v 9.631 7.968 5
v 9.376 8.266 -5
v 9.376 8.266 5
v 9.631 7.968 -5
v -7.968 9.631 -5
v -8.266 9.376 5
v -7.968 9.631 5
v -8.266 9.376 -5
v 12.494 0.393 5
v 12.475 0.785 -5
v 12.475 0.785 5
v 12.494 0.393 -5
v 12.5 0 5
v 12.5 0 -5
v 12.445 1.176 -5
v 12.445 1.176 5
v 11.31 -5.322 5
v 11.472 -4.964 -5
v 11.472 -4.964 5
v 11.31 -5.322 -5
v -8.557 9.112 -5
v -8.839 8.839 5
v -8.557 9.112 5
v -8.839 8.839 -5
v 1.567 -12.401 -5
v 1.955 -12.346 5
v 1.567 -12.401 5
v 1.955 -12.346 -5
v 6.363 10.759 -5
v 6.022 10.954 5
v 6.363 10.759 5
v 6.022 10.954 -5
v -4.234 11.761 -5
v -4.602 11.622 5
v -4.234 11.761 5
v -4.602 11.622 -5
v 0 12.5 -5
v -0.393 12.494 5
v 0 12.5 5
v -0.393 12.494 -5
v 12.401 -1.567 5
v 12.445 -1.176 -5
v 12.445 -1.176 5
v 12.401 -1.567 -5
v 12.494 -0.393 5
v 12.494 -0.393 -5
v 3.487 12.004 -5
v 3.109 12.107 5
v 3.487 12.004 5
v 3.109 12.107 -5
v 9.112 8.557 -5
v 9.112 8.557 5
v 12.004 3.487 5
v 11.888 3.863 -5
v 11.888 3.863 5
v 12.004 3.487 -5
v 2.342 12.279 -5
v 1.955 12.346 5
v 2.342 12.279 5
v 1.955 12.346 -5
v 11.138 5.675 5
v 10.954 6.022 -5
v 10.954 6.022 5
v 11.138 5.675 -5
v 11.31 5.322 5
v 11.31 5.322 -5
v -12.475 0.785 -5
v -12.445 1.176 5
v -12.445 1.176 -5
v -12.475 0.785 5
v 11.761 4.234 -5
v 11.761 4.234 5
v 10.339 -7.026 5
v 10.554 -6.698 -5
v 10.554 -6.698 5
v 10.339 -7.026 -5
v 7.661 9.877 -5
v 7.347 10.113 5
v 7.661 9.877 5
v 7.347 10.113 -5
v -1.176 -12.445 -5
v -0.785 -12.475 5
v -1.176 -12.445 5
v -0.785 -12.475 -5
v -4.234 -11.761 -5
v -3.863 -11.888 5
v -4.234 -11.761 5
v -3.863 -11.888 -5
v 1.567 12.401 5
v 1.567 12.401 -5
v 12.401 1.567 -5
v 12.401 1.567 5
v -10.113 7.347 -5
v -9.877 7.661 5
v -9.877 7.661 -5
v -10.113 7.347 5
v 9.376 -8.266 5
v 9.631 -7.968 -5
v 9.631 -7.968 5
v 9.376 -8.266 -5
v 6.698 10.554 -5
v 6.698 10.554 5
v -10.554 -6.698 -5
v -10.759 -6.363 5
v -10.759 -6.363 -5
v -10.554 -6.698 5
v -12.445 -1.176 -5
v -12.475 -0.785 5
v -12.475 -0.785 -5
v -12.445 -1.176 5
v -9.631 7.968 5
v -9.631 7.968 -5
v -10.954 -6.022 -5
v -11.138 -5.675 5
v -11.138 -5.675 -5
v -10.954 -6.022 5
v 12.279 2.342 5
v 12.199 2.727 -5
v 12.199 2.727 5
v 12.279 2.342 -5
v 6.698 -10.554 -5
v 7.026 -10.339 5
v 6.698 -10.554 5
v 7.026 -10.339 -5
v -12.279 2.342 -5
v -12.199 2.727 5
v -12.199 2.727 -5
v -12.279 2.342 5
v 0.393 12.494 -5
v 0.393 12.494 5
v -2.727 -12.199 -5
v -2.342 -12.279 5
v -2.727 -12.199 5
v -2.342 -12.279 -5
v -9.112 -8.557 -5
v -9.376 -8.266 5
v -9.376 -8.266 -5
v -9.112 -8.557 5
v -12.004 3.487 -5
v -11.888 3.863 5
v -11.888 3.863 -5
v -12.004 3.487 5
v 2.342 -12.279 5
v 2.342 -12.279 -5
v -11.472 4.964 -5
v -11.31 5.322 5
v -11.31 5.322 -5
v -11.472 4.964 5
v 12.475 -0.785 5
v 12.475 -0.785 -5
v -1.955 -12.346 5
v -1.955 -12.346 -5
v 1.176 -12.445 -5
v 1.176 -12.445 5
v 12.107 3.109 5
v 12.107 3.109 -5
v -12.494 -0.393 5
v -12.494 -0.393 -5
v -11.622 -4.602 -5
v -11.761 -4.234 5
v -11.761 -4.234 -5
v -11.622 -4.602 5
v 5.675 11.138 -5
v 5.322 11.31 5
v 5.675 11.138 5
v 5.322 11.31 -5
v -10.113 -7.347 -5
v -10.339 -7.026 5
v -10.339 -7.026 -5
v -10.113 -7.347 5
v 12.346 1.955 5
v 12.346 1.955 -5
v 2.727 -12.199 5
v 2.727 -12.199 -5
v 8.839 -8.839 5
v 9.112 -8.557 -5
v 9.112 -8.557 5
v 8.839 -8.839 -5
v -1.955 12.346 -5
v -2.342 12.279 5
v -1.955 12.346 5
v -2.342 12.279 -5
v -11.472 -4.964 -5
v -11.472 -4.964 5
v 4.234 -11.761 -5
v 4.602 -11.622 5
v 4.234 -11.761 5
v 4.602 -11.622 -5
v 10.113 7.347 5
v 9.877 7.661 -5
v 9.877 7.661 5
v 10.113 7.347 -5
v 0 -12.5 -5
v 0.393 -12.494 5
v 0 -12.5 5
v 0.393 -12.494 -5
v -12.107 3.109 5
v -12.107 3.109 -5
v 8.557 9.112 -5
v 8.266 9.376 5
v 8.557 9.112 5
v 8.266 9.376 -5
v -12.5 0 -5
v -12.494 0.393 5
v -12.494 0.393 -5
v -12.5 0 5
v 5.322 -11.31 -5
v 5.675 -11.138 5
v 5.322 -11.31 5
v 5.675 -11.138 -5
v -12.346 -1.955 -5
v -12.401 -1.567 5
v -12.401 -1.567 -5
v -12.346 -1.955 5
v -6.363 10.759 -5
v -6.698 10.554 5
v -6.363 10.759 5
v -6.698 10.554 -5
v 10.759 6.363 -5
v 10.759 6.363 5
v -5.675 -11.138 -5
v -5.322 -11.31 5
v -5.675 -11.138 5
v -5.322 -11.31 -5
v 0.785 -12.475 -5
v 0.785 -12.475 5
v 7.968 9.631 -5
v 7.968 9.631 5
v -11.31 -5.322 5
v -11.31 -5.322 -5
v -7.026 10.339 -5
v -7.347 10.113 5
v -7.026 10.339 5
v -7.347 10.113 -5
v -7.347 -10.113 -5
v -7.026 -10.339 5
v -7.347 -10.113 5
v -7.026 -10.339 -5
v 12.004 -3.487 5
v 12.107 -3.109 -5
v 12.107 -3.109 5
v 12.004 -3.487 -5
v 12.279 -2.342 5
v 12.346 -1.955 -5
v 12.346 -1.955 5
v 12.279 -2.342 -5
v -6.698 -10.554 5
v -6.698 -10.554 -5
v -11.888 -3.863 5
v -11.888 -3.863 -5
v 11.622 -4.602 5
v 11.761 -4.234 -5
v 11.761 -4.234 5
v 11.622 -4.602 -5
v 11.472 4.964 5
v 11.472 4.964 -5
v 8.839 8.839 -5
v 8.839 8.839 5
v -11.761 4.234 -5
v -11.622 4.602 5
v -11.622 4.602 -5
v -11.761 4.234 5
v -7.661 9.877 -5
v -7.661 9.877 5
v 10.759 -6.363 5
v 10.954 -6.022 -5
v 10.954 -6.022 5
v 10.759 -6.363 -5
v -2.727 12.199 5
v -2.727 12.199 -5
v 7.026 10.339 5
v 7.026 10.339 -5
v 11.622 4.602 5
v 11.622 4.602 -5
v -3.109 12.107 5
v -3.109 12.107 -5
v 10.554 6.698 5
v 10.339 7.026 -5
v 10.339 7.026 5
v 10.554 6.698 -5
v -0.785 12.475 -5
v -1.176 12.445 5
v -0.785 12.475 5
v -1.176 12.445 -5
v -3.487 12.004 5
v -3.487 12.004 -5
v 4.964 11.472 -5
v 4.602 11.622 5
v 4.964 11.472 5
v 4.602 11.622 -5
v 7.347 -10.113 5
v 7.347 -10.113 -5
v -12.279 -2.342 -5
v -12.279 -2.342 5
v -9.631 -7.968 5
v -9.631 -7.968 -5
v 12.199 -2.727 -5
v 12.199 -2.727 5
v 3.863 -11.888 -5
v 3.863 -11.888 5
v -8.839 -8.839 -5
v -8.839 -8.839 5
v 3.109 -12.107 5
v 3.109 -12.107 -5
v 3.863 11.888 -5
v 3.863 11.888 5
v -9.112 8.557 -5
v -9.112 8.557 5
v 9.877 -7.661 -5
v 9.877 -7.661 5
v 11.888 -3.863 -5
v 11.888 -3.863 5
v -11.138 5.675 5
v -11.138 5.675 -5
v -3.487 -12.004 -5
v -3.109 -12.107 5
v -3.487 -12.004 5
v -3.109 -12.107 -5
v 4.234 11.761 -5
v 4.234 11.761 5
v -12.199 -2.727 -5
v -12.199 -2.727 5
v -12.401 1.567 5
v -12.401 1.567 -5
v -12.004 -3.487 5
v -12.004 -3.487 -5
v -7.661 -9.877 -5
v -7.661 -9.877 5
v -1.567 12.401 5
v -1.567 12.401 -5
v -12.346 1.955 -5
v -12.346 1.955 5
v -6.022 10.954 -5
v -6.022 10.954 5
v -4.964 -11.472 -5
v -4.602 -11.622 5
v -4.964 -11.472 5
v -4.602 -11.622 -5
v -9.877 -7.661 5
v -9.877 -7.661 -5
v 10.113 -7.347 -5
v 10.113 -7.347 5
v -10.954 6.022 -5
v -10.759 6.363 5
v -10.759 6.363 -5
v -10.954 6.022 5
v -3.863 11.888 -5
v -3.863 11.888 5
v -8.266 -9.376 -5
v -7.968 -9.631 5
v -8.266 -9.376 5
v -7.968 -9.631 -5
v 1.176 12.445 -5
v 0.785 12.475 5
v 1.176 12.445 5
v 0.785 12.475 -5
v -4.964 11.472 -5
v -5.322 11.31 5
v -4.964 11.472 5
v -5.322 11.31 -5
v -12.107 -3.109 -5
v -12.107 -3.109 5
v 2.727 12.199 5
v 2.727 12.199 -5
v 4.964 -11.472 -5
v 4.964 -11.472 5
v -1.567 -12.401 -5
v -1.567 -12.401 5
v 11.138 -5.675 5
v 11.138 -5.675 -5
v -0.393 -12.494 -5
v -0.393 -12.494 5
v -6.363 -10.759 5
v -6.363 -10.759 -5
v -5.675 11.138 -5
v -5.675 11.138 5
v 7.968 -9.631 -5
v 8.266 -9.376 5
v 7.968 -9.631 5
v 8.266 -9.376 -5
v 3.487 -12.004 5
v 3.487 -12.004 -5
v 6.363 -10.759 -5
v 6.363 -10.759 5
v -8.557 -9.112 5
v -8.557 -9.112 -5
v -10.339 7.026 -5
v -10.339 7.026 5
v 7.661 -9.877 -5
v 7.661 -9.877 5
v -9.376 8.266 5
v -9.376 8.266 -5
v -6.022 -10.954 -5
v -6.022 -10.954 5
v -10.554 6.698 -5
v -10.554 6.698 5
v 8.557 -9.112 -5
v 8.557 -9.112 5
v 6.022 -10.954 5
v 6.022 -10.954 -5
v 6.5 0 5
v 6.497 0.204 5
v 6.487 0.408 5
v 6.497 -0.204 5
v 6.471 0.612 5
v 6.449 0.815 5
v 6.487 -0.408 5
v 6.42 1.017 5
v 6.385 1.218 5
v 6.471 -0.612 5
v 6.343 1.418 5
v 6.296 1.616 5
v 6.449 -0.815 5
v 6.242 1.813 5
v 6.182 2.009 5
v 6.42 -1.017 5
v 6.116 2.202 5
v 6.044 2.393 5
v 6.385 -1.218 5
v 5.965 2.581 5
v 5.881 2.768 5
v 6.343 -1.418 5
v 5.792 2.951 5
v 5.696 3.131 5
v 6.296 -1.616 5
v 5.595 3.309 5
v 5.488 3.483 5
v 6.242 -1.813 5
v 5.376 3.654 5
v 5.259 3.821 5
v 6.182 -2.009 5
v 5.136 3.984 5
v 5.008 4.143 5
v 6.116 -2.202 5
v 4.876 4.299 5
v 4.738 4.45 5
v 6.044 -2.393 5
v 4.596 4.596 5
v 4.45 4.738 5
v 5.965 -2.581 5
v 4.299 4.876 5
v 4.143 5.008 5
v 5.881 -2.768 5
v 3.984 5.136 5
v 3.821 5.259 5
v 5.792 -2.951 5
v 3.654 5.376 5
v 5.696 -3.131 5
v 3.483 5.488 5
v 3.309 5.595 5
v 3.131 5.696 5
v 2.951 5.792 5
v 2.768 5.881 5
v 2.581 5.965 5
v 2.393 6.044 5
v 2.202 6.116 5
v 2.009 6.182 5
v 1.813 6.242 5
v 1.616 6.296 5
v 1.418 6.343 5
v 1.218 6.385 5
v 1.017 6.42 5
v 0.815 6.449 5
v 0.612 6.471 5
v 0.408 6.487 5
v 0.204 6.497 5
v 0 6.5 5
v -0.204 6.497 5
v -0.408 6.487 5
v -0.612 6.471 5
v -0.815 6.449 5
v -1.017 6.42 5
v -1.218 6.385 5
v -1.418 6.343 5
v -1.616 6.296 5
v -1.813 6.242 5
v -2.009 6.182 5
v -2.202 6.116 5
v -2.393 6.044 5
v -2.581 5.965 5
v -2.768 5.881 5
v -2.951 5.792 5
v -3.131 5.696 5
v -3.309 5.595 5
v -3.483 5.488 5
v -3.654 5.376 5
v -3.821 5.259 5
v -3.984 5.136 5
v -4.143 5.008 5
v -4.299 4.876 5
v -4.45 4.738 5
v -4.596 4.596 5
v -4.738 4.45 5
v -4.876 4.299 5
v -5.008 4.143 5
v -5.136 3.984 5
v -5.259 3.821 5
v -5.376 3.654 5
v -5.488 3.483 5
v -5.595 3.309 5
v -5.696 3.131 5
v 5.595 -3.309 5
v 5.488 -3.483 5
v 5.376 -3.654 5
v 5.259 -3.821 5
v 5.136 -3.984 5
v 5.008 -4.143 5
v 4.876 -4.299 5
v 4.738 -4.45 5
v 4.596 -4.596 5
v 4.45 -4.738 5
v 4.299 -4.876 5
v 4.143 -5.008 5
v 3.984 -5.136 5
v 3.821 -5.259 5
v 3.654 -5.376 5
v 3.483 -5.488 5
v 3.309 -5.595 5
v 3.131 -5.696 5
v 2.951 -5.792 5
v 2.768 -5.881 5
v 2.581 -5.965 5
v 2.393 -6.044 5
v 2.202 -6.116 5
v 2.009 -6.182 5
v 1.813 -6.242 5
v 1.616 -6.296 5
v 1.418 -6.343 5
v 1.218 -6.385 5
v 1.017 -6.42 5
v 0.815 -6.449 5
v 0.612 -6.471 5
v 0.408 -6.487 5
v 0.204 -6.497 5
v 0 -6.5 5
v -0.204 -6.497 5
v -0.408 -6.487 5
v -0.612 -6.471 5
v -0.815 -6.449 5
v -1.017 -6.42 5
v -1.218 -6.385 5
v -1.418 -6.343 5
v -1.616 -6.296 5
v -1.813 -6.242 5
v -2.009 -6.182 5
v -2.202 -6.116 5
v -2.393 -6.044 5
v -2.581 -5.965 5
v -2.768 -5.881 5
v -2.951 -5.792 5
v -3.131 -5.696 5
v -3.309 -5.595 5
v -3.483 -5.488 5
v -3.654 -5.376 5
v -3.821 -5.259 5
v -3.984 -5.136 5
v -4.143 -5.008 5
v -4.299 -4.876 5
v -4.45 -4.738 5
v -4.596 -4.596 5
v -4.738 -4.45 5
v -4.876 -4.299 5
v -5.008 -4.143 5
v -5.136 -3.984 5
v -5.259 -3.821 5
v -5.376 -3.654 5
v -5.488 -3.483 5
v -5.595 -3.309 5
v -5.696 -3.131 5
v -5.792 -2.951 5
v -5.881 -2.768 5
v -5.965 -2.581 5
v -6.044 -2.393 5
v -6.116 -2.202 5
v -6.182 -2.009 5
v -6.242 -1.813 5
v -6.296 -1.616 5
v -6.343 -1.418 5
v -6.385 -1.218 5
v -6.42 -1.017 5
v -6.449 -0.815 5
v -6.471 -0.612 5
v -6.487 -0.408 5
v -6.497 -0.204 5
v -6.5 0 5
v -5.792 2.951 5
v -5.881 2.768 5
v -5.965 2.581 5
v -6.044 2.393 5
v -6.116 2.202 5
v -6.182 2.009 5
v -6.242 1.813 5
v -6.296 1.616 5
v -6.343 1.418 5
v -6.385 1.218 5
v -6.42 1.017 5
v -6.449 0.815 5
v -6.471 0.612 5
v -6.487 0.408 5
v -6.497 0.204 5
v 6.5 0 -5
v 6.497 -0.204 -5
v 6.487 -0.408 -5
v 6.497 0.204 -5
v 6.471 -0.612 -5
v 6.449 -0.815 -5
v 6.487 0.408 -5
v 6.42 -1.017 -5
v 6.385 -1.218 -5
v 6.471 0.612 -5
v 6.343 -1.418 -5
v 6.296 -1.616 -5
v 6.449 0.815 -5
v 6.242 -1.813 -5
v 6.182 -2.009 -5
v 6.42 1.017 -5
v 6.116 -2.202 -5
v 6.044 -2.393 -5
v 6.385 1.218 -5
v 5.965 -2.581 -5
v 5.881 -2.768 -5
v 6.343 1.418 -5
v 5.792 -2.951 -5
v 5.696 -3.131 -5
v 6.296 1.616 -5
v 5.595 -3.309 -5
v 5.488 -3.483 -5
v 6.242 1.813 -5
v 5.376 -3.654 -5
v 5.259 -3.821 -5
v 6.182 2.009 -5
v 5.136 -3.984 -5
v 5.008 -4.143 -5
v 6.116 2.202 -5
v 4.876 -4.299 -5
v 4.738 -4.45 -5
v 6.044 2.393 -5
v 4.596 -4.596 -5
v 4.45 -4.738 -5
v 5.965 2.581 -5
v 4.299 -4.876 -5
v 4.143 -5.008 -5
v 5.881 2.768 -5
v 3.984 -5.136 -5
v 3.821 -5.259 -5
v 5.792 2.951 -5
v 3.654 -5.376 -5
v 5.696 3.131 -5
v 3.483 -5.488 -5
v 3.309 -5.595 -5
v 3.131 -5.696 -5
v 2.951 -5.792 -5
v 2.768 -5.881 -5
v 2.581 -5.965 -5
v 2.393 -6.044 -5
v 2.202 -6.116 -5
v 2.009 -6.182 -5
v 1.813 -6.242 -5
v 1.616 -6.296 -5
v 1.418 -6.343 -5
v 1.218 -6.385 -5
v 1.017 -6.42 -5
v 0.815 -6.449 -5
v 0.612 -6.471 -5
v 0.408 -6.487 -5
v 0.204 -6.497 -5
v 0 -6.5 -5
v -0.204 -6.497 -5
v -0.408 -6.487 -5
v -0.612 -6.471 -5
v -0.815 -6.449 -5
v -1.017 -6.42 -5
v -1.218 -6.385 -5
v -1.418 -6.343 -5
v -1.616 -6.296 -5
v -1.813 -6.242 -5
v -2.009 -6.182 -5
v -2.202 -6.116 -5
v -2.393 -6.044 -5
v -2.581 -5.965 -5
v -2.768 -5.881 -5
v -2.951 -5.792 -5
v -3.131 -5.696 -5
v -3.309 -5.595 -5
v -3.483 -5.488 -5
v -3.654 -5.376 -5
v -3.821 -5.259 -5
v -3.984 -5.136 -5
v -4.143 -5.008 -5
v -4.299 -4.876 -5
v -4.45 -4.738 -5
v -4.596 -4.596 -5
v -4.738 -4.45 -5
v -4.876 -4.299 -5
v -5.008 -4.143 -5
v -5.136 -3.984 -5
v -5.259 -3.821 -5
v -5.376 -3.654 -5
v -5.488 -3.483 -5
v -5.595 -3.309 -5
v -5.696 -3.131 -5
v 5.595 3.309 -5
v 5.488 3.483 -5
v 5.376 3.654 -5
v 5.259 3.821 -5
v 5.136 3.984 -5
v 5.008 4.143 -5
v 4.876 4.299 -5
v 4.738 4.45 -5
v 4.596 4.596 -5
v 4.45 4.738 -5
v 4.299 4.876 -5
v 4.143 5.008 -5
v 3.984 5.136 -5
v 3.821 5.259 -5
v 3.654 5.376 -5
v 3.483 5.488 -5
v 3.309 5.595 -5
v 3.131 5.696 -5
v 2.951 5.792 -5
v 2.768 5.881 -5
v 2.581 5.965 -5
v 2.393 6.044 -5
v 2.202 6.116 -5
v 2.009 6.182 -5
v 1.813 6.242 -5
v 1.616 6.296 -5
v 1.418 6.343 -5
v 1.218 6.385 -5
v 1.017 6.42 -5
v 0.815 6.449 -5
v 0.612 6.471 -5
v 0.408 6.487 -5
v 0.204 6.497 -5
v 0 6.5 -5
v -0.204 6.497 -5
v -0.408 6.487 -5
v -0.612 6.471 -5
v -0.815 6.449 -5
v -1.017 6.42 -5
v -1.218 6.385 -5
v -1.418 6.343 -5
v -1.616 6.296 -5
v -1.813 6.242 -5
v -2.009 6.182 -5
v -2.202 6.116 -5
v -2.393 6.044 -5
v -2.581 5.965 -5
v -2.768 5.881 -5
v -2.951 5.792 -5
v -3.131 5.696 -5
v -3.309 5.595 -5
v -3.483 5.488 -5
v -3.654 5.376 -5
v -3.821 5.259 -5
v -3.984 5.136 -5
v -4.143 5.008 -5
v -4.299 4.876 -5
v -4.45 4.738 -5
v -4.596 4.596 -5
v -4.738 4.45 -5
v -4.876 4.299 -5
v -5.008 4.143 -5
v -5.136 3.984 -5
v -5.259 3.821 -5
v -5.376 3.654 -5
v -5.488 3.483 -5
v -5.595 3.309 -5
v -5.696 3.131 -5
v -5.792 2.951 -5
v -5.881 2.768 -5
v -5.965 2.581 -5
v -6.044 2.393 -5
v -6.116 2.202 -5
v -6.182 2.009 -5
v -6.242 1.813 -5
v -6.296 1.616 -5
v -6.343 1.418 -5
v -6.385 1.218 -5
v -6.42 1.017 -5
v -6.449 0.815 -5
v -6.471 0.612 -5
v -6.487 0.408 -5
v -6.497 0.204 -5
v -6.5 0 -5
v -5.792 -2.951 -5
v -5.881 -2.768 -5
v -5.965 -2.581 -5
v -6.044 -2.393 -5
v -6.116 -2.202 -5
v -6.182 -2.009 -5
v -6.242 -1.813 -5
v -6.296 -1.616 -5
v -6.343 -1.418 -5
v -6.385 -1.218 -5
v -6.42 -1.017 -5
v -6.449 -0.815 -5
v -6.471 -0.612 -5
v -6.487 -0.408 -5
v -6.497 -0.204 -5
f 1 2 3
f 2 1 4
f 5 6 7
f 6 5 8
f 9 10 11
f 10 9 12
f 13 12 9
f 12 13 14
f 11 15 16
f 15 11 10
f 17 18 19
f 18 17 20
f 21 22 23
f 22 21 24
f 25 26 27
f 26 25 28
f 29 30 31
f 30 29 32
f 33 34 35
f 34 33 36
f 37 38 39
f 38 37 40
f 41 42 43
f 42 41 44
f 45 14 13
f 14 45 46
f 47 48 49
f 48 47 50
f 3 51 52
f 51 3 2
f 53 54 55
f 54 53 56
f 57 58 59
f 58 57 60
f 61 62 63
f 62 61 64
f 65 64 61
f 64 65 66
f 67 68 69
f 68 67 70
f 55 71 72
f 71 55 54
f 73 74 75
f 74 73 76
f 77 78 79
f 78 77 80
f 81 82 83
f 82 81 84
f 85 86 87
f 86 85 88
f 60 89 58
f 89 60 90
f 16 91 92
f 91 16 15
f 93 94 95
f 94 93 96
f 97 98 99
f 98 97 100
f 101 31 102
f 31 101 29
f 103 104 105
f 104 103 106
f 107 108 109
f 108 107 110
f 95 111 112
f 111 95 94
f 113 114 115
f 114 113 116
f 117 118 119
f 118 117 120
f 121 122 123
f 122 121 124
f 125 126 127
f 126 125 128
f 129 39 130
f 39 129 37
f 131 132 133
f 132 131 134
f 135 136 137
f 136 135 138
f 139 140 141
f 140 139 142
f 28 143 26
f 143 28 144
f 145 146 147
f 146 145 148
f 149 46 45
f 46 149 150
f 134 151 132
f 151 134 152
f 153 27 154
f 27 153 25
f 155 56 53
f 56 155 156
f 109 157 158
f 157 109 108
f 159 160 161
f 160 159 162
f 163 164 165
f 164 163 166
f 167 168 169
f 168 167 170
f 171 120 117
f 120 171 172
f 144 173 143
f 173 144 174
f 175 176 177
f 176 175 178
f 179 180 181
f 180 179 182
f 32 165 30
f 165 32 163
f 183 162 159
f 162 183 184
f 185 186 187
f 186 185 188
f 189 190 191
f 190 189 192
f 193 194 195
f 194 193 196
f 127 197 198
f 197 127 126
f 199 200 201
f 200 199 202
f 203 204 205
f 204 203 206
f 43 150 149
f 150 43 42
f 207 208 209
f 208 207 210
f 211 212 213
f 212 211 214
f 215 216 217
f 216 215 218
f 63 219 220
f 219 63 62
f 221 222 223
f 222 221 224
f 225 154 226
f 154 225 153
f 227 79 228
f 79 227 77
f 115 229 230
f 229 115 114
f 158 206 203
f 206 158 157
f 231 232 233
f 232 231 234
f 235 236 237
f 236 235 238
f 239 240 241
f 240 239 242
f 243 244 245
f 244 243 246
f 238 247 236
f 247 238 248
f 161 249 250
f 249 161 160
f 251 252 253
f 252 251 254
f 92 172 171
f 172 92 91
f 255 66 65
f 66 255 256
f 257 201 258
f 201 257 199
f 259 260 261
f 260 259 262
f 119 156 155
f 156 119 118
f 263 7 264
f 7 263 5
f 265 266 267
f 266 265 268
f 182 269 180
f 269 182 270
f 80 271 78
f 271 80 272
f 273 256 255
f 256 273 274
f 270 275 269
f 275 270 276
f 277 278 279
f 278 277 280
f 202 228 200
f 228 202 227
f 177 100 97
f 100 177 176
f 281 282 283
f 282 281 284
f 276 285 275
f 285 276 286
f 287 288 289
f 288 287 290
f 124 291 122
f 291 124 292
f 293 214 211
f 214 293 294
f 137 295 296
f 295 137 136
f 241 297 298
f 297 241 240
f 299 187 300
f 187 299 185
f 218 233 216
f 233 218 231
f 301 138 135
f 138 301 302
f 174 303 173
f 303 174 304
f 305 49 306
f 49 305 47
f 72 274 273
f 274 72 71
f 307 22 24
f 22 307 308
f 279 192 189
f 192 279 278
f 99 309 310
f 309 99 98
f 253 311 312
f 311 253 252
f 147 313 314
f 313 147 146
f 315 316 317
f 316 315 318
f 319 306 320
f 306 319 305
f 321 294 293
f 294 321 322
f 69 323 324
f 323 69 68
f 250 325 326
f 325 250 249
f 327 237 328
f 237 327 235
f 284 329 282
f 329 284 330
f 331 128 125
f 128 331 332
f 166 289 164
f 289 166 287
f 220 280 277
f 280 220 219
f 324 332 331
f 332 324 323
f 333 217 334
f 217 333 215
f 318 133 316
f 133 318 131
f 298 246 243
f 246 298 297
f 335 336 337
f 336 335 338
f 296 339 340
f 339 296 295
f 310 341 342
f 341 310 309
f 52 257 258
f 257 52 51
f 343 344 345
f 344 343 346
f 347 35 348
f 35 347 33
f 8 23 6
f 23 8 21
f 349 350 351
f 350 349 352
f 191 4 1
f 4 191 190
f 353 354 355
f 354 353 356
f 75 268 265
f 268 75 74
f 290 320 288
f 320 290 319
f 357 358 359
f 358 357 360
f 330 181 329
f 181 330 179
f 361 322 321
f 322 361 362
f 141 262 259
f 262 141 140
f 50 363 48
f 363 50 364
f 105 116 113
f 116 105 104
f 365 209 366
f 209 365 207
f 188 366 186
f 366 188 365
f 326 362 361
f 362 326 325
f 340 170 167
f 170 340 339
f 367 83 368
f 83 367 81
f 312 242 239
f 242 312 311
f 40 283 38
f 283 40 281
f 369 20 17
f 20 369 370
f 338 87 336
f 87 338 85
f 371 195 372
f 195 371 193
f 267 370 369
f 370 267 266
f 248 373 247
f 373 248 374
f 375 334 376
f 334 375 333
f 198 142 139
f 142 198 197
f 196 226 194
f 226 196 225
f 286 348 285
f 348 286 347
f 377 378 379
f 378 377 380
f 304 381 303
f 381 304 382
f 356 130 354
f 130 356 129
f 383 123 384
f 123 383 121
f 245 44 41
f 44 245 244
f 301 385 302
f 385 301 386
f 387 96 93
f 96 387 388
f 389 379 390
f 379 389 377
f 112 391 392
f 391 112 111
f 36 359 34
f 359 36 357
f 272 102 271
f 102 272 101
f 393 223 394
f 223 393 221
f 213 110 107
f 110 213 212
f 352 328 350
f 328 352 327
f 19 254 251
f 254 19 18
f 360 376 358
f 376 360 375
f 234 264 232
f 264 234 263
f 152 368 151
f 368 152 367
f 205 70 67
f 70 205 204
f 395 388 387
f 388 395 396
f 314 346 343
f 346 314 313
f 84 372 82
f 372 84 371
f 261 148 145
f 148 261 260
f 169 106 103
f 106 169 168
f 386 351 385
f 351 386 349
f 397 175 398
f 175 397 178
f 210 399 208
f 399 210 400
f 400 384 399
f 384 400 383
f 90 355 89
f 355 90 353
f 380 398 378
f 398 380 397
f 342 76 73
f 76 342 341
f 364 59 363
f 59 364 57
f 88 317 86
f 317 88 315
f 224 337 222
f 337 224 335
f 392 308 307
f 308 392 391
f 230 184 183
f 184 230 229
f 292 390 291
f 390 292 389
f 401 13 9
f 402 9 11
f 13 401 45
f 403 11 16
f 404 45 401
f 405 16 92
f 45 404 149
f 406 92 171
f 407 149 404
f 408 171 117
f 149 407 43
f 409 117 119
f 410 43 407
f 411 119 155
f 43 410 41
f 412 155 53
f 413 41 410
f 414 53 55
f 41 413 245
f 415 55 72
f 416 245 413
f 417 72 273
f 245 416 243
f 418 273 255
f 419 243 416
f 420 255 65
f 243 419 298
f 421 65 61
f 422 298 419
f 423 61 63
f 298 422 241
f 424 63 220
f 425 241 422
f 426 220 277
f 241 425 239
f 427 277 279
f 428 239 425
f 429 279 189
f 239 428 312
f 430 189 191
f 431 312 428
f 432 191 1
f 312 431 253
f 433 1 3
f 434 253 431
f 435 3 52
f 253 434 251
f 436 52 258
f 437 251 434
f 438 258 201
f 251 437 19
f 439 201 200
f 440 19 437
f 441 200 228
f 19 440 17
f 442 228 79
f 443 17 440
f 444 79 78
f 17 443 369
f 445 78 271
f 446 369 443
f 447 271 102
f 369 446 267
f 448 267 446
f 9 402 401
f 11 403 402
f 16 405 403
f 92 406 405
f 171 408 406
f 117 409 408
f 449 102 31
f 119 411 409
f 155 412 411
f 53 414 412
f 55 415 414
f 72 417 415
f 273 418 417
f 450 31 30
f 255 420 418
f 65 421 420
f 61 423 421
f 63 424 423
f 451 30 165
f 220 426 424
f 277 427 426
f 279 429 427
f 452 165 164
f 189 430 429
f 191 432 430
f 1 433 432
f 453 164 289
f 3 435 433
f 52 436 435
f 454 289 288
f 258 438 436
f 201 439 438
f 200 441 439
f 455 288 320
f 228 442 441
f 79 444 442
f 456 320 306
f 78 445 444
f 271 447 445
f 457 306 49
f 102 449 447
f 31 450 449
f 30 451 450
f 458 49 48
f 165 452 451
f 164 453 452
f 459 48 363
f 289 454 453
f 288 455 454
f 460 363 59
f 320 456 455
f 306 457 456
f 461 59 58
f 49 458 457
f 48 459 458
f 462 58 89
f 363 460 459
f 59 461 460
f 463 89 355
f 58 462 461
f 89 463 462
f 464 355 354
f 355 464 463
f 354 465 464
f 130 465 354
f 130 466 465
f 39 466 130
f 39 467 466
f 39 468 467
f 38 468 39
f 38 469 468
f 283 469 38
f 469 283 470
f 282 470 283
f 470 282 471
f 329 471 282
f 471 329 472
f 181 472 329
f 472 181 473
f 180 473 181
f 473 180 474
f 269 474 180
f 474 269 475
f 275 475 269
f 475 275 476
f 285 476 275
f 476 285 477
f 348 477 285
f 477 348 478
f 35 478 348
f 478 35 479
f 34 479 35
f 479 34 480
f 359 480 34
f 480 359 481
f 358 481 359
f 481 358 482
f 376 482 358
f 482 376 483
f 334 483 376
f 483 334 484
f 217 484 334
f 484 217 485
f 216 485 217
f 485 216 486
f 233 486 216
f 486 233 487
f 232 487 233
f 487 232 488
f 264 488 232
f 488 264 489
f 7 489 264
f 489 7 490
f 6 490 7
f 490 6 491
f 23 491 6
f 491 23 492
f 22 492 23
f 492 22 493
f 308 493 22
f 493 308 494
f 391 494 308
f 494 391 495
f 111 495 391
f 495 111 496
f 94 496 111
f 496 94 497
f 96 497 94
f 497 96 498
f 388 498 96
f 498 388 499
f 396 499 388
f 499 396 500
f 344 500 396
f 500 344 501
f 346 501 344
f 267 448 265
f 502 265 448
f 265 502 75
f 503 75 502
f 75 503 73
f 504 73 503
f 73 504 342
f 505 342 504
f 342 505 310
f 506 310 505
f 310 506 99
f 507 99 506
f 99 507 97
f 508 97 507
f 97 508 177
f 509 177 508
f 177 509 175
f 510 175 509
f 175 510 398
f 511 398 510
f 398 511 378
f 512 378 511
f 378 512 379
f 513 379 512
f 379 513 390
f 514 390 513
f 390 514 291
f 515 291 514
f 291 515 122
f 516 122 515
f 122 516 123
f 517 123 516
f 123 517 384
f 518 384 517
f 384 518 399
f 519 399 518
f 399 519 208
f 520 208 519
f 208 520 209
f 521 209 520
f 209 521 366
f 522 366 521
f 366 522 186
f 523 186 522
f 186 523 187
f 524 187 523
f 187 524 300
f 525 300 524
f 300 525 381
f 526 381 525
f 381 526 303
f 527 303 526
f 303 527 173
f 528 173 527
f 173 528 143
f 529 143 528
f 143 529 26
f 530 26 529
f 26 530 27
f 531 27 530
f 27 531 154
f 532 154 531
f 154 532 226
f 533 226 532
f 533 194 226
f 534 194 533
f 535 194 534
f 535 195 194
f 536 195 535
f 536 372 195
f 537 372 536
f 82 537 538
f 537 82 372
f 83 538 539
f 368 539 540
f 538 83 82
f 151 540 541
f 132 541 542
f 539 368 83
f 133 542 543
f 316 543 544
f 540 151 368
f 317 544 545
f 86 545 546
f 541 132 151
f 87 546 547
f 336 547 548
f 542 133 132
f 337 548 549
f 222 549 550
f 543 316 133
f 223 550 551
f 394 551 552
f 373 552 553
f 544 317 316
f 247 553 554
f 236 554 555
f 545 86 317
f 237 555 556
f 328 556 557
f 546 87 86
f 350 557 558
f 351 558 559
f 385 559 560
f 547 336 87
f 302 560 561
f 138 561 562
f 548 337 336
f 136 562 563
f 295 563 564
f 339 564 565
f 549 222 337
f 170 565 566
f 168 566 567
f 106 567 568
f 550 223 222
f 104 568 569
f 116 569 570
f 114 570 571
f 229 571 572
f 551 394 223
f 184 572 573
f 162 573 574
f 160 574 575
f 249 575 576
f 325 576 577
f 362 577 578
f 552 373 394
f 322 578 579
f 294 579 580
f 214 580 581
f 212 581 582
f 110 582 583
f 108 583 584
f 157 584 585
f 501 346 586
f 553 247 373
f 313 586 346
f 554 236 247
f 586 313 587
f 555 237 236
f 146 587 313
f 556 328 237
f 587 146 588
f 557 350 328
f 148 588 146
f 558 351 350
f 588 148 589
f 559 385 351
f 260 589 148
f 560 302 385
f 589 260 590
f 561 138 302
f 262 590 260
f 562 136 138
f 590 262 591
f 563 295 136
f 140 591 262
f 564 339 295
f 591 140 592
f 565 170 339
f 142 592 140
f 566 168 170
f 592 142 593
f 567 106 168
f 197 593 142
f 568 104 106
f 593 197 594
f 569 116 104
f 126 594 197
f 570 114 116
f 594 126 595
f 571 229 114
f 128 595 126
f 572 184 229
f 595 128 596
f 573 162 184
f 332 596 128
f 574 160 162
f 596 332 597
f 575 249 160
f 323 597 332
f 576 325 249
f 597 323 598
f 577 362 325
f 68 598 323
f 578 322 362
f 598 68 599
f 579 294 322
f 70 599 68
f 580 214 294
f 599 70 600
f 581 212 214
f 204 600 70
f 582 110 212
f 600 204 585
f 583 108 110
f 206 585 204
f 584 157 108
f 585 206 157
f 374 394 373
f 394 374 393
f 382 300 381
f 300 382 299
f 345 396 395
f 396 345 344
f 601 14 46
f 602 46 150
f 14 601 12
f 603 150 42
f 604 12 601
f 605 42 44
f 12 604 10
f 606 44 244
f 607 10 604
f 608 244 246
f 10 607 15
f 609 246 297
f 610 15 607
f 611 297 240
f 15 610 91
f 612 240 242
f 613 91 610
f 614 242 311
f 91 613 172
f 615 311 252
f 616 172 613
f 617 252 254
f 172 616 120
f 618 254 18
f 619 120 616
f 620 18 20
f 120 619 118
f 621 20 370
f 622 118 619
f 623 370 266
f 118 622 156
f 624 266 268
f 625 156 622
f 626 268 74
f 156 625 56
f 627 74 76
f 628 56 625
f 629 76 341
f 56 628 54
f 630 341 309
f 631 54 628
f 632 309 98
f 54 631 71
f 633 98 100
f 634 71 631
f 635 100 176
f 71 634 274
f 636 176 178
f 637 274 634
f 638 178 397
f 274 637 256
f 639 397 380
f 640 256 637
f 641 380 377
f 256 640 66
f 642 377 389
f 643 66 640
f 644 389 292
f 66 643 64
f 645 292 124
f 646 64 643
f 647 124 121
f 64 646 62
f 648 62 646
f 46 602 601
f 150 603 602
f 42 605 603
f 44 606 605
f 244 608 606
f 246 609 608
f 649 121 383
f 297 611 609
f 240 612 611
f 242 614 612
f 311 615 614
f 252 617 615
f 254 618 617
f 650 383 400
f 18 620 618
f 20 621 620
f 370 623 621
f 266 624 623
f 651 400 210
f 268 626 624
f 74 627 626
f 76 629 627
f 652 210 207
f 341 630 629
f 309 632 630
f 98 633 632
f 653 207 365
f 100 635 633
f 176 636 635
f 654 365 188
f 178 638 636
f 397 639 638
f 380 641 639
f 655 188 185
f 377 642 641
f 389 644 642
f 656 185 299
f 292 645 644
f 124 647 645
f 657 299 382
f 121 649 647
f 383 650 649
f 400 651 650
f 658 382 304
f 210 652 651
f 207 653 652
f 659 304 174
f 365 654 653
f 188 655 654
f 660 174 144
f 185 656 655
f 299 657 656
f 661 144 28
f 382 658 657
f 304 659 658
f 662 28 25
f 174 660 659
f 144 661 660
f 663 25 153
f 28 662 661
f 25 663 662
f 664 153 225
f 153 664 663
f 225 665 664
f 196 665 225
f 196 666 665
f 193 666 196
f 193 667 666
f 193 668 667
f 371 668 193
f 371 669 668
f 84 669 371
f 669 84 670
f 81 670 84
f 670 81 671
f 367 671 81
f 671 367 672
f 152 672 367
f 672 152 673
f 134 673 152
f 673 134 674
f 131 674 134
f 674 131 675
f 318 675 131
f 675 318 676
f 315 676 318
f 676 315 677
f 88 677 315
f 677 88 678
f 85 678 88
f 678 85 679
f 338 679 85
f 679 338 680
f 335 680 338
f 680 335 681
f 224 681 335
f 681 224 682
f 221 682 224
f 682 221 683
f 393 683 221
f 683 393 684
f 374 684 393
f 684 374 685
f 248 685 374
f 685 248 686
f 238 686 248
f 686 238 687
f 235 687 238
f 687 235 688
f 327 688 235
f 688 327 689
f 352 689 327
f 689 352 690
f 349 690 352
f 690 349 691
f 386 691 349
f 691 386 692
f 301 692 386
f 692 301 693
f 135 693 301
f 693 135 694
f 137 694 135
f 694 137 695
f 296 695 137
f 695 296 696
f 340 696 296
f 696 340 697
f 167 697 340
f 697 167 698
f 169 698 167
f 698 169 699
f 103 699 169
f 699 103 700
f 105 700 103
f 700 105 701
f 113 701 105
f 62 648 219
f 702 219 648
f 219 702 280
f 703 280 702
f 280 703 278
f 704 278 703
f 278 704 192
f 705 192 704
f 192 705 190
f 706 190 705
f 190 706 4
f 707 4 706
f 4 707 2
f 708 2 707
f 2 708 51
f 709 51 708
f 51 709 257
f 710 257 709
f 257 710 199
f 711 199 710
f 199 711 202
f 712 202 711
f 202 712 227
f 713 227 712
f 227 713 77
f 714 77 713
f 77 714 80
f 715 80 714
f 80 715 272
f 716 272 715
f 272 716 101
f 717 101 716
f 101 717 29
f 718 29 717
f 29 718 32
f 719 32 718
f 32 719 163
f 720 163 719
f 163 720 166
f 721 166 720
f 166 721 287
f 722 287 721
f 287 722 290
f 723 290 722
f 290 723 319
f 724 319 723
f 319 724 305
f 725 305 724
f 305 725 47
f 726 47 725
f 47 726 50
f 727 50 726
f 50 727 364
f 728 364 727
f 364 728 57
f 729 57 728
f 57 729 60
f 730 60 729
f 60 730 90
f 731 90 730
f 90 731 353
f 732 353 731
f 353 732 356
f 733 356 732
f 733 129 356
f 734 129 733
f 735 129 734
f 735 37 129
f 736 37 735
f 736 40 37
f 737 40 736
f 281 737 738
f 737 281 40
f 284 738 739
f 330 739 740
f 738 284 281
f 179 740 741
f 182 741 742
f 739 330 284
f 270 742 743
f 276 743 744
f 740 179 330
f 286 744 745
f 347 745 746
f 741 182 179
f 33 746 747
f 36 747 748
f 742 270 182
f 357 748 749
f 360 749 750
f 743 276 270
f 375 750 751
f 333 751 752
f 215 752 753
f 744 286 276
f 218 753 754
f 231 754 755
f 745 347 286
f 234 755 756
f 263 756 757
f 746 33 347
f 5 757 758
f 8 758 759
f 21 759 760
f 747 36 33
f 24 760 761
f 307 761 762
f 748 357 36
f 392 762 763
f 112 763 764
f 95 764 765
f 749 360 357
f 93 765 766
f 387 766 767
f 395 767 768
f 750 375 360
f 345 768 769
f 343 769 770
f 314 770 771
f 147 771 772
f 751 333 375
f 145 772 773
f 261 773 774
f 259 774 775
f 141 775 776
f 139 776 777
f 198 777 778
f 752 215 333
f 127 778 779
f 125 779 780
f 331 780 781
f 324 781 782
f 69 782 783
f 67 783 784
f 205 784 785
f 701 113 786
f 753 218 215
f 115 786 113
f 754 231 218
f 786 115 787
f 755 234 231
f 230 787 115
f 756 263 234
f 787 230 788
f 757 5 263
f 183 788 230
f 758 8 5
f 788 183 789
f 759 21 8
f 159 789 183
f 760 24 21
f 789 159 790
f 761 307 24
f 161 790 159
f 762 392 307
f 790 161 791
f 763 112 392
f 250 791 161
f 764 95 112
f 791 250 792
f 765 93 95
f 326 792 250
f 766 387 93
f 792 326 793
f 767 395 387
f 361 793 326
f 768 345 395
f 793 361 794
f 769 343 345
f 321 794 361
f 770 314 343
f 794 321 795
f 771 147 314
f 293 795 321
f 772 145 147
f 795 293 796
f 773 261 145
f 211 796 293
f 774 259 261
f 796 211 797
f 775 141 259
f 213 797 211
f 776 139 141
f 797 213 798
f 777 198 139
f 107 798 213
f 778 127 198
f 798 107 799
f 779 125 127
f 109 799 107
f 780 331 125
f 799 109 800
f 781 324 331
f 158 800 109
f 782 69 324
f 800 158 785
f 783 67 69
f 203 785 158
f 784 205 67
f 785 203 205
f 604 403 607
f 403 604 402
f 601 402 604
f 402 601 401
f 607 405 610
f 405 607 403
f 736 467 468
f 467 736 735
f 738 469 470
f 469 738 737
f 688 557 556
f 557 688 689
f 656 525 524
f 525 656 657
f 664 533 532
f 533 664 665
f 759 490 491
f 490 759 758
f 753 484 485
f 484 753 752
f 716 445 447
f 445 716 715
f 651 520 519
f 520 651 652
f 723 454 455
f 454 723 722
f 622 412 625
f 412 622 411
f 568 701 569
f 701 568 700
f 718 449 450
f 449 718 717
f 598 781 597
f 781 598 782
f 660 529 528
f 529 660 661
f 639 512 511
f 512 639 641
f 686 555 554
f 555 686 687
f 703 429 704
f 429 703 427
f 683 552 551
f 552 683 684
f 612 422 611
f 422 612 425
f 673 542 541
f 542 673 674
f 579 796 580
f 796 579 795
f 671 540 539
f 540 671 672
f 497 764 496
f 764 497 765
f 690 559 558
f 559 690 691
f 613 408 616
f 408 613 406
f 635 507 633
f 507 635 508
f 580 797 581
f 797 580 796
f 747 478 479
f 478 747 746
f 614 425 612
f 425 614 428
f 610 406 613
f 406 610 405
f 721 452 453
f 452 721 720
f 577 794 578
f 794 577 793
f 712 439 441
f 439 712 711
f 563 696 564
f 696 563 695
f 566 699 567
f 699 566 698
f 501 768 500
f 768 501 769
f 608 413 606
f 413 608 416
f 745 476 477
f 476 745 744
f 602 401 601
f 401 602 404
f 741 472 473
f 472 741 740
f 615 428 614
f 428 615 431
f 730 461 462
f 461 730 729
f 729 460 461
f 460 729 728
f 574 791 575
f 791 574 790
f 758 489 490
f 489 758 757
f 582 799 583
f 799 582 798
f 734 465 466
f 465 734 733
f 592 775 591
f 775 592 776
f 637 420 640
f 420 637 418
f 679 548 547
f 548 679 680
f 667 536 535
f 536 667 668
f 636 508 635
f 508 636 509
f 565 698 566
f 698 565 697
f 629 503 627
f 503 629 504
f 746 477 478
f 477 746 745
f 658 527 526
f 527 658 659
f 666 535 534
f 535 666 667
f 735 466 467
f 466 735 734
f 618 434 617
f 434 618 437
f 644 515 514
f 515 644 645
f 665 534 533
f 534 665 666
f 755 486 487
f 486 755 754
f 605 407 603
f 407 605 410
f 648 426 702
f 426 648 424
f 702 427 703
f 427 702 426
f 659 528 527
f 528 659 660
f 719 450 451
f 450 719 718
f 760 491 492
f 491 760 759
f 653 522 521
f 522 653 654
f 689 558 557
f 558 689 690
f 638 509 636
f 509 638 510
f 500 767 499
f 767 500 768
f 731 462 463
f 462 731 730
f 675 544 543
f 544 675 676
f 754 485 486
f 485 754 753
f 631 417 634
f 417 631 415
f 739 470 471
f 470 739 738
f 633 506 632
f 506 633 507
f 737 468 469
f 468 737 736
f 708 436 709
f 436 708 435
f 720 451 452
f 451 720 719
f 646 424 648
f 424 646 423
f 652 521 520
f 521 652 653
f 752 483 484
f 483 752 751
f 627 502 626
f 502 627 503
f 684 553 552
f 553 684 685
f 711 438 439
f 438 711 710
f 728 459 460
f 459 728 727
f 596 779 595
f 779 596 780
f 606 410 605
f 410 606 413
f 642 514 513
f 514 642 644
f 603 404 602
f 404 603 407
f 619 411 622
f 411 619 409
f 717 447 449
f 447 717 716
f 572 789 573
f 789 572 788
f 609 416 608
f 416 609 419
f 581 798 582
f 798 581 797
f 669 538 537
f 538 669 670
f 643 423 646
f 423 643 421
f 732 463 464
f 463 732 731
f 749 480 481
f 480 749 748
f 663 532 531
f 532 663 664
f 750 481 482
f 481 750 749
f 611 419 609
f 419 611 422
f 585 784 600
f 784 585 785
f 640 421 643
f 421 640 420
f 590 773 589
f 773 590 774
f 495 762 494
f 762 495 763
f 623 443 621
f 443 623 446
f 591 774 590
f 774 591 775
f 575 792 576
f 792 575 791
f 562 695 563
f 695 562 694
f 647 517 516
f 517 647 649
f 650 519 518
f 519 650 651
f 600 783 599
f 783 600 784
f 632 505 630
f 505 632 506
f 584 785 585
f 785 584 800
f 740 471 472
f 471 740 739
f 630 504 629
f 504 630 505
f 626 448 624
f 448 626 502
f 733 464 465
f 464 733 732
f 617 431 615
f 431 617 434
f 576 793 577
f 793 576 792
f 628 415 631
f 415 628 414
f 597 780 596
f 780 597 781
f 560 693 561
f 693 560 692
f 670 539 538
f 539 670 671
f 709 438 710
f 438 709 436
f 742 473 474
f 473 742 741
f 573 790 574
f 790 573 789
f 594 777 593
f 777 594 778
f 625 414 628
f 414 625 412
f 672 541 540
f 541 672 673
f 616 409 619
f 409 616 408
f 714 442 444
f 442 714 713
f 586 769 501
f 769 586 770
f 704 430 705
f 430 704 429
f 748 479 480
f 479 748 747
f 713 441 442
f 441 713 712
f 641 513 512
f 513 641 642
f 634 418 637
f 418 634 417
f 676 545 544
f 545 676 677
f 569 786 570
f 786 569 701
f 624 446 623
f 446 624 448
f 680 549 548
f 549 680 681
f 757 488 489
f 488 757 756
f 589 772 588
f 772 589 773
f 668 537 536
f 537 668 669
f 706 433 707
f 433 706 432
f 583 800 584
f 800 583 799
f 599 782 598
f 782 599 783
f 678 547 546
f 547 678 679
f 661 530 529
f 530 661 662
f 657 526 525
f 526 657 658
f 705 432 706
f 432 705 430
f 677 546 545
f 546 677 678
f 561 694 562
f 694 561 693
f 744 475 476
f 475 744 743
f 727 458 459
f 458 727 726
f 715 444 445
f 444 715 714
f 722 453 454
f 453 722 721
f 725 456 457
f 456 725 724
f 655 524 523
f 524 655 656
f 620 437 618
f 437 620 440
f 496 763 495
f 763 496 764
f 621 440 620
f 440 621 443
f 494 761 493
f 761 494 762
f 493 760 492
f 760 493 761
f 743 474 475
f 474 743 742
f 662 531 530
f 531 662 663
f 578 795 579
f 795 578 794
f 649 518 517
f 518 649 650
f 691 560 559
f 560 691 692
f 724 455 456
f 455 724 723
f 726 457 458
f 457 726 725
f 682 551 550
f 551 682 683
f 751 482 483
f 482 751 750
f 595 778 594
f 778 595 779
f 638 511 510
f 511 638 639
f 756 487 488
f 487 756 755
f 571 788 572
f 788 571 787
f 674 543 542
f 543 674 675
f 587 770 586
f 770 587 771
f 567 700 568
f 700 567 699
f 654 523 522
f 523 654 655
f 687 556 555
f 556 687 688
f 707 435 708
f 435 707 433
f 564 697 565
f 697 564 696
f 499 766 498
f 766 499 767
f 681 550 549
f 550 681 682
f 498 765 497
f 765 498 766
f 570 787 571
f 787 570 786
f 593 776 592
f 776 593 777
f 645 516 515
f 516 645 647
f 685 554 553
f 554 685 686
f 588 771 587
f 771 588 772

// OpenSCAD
$fn = 200;

difference() {
  cylinder(10, 12.5, 12.5, true);
  cylinder(10.1, 6.5, 6.5, true);
}
